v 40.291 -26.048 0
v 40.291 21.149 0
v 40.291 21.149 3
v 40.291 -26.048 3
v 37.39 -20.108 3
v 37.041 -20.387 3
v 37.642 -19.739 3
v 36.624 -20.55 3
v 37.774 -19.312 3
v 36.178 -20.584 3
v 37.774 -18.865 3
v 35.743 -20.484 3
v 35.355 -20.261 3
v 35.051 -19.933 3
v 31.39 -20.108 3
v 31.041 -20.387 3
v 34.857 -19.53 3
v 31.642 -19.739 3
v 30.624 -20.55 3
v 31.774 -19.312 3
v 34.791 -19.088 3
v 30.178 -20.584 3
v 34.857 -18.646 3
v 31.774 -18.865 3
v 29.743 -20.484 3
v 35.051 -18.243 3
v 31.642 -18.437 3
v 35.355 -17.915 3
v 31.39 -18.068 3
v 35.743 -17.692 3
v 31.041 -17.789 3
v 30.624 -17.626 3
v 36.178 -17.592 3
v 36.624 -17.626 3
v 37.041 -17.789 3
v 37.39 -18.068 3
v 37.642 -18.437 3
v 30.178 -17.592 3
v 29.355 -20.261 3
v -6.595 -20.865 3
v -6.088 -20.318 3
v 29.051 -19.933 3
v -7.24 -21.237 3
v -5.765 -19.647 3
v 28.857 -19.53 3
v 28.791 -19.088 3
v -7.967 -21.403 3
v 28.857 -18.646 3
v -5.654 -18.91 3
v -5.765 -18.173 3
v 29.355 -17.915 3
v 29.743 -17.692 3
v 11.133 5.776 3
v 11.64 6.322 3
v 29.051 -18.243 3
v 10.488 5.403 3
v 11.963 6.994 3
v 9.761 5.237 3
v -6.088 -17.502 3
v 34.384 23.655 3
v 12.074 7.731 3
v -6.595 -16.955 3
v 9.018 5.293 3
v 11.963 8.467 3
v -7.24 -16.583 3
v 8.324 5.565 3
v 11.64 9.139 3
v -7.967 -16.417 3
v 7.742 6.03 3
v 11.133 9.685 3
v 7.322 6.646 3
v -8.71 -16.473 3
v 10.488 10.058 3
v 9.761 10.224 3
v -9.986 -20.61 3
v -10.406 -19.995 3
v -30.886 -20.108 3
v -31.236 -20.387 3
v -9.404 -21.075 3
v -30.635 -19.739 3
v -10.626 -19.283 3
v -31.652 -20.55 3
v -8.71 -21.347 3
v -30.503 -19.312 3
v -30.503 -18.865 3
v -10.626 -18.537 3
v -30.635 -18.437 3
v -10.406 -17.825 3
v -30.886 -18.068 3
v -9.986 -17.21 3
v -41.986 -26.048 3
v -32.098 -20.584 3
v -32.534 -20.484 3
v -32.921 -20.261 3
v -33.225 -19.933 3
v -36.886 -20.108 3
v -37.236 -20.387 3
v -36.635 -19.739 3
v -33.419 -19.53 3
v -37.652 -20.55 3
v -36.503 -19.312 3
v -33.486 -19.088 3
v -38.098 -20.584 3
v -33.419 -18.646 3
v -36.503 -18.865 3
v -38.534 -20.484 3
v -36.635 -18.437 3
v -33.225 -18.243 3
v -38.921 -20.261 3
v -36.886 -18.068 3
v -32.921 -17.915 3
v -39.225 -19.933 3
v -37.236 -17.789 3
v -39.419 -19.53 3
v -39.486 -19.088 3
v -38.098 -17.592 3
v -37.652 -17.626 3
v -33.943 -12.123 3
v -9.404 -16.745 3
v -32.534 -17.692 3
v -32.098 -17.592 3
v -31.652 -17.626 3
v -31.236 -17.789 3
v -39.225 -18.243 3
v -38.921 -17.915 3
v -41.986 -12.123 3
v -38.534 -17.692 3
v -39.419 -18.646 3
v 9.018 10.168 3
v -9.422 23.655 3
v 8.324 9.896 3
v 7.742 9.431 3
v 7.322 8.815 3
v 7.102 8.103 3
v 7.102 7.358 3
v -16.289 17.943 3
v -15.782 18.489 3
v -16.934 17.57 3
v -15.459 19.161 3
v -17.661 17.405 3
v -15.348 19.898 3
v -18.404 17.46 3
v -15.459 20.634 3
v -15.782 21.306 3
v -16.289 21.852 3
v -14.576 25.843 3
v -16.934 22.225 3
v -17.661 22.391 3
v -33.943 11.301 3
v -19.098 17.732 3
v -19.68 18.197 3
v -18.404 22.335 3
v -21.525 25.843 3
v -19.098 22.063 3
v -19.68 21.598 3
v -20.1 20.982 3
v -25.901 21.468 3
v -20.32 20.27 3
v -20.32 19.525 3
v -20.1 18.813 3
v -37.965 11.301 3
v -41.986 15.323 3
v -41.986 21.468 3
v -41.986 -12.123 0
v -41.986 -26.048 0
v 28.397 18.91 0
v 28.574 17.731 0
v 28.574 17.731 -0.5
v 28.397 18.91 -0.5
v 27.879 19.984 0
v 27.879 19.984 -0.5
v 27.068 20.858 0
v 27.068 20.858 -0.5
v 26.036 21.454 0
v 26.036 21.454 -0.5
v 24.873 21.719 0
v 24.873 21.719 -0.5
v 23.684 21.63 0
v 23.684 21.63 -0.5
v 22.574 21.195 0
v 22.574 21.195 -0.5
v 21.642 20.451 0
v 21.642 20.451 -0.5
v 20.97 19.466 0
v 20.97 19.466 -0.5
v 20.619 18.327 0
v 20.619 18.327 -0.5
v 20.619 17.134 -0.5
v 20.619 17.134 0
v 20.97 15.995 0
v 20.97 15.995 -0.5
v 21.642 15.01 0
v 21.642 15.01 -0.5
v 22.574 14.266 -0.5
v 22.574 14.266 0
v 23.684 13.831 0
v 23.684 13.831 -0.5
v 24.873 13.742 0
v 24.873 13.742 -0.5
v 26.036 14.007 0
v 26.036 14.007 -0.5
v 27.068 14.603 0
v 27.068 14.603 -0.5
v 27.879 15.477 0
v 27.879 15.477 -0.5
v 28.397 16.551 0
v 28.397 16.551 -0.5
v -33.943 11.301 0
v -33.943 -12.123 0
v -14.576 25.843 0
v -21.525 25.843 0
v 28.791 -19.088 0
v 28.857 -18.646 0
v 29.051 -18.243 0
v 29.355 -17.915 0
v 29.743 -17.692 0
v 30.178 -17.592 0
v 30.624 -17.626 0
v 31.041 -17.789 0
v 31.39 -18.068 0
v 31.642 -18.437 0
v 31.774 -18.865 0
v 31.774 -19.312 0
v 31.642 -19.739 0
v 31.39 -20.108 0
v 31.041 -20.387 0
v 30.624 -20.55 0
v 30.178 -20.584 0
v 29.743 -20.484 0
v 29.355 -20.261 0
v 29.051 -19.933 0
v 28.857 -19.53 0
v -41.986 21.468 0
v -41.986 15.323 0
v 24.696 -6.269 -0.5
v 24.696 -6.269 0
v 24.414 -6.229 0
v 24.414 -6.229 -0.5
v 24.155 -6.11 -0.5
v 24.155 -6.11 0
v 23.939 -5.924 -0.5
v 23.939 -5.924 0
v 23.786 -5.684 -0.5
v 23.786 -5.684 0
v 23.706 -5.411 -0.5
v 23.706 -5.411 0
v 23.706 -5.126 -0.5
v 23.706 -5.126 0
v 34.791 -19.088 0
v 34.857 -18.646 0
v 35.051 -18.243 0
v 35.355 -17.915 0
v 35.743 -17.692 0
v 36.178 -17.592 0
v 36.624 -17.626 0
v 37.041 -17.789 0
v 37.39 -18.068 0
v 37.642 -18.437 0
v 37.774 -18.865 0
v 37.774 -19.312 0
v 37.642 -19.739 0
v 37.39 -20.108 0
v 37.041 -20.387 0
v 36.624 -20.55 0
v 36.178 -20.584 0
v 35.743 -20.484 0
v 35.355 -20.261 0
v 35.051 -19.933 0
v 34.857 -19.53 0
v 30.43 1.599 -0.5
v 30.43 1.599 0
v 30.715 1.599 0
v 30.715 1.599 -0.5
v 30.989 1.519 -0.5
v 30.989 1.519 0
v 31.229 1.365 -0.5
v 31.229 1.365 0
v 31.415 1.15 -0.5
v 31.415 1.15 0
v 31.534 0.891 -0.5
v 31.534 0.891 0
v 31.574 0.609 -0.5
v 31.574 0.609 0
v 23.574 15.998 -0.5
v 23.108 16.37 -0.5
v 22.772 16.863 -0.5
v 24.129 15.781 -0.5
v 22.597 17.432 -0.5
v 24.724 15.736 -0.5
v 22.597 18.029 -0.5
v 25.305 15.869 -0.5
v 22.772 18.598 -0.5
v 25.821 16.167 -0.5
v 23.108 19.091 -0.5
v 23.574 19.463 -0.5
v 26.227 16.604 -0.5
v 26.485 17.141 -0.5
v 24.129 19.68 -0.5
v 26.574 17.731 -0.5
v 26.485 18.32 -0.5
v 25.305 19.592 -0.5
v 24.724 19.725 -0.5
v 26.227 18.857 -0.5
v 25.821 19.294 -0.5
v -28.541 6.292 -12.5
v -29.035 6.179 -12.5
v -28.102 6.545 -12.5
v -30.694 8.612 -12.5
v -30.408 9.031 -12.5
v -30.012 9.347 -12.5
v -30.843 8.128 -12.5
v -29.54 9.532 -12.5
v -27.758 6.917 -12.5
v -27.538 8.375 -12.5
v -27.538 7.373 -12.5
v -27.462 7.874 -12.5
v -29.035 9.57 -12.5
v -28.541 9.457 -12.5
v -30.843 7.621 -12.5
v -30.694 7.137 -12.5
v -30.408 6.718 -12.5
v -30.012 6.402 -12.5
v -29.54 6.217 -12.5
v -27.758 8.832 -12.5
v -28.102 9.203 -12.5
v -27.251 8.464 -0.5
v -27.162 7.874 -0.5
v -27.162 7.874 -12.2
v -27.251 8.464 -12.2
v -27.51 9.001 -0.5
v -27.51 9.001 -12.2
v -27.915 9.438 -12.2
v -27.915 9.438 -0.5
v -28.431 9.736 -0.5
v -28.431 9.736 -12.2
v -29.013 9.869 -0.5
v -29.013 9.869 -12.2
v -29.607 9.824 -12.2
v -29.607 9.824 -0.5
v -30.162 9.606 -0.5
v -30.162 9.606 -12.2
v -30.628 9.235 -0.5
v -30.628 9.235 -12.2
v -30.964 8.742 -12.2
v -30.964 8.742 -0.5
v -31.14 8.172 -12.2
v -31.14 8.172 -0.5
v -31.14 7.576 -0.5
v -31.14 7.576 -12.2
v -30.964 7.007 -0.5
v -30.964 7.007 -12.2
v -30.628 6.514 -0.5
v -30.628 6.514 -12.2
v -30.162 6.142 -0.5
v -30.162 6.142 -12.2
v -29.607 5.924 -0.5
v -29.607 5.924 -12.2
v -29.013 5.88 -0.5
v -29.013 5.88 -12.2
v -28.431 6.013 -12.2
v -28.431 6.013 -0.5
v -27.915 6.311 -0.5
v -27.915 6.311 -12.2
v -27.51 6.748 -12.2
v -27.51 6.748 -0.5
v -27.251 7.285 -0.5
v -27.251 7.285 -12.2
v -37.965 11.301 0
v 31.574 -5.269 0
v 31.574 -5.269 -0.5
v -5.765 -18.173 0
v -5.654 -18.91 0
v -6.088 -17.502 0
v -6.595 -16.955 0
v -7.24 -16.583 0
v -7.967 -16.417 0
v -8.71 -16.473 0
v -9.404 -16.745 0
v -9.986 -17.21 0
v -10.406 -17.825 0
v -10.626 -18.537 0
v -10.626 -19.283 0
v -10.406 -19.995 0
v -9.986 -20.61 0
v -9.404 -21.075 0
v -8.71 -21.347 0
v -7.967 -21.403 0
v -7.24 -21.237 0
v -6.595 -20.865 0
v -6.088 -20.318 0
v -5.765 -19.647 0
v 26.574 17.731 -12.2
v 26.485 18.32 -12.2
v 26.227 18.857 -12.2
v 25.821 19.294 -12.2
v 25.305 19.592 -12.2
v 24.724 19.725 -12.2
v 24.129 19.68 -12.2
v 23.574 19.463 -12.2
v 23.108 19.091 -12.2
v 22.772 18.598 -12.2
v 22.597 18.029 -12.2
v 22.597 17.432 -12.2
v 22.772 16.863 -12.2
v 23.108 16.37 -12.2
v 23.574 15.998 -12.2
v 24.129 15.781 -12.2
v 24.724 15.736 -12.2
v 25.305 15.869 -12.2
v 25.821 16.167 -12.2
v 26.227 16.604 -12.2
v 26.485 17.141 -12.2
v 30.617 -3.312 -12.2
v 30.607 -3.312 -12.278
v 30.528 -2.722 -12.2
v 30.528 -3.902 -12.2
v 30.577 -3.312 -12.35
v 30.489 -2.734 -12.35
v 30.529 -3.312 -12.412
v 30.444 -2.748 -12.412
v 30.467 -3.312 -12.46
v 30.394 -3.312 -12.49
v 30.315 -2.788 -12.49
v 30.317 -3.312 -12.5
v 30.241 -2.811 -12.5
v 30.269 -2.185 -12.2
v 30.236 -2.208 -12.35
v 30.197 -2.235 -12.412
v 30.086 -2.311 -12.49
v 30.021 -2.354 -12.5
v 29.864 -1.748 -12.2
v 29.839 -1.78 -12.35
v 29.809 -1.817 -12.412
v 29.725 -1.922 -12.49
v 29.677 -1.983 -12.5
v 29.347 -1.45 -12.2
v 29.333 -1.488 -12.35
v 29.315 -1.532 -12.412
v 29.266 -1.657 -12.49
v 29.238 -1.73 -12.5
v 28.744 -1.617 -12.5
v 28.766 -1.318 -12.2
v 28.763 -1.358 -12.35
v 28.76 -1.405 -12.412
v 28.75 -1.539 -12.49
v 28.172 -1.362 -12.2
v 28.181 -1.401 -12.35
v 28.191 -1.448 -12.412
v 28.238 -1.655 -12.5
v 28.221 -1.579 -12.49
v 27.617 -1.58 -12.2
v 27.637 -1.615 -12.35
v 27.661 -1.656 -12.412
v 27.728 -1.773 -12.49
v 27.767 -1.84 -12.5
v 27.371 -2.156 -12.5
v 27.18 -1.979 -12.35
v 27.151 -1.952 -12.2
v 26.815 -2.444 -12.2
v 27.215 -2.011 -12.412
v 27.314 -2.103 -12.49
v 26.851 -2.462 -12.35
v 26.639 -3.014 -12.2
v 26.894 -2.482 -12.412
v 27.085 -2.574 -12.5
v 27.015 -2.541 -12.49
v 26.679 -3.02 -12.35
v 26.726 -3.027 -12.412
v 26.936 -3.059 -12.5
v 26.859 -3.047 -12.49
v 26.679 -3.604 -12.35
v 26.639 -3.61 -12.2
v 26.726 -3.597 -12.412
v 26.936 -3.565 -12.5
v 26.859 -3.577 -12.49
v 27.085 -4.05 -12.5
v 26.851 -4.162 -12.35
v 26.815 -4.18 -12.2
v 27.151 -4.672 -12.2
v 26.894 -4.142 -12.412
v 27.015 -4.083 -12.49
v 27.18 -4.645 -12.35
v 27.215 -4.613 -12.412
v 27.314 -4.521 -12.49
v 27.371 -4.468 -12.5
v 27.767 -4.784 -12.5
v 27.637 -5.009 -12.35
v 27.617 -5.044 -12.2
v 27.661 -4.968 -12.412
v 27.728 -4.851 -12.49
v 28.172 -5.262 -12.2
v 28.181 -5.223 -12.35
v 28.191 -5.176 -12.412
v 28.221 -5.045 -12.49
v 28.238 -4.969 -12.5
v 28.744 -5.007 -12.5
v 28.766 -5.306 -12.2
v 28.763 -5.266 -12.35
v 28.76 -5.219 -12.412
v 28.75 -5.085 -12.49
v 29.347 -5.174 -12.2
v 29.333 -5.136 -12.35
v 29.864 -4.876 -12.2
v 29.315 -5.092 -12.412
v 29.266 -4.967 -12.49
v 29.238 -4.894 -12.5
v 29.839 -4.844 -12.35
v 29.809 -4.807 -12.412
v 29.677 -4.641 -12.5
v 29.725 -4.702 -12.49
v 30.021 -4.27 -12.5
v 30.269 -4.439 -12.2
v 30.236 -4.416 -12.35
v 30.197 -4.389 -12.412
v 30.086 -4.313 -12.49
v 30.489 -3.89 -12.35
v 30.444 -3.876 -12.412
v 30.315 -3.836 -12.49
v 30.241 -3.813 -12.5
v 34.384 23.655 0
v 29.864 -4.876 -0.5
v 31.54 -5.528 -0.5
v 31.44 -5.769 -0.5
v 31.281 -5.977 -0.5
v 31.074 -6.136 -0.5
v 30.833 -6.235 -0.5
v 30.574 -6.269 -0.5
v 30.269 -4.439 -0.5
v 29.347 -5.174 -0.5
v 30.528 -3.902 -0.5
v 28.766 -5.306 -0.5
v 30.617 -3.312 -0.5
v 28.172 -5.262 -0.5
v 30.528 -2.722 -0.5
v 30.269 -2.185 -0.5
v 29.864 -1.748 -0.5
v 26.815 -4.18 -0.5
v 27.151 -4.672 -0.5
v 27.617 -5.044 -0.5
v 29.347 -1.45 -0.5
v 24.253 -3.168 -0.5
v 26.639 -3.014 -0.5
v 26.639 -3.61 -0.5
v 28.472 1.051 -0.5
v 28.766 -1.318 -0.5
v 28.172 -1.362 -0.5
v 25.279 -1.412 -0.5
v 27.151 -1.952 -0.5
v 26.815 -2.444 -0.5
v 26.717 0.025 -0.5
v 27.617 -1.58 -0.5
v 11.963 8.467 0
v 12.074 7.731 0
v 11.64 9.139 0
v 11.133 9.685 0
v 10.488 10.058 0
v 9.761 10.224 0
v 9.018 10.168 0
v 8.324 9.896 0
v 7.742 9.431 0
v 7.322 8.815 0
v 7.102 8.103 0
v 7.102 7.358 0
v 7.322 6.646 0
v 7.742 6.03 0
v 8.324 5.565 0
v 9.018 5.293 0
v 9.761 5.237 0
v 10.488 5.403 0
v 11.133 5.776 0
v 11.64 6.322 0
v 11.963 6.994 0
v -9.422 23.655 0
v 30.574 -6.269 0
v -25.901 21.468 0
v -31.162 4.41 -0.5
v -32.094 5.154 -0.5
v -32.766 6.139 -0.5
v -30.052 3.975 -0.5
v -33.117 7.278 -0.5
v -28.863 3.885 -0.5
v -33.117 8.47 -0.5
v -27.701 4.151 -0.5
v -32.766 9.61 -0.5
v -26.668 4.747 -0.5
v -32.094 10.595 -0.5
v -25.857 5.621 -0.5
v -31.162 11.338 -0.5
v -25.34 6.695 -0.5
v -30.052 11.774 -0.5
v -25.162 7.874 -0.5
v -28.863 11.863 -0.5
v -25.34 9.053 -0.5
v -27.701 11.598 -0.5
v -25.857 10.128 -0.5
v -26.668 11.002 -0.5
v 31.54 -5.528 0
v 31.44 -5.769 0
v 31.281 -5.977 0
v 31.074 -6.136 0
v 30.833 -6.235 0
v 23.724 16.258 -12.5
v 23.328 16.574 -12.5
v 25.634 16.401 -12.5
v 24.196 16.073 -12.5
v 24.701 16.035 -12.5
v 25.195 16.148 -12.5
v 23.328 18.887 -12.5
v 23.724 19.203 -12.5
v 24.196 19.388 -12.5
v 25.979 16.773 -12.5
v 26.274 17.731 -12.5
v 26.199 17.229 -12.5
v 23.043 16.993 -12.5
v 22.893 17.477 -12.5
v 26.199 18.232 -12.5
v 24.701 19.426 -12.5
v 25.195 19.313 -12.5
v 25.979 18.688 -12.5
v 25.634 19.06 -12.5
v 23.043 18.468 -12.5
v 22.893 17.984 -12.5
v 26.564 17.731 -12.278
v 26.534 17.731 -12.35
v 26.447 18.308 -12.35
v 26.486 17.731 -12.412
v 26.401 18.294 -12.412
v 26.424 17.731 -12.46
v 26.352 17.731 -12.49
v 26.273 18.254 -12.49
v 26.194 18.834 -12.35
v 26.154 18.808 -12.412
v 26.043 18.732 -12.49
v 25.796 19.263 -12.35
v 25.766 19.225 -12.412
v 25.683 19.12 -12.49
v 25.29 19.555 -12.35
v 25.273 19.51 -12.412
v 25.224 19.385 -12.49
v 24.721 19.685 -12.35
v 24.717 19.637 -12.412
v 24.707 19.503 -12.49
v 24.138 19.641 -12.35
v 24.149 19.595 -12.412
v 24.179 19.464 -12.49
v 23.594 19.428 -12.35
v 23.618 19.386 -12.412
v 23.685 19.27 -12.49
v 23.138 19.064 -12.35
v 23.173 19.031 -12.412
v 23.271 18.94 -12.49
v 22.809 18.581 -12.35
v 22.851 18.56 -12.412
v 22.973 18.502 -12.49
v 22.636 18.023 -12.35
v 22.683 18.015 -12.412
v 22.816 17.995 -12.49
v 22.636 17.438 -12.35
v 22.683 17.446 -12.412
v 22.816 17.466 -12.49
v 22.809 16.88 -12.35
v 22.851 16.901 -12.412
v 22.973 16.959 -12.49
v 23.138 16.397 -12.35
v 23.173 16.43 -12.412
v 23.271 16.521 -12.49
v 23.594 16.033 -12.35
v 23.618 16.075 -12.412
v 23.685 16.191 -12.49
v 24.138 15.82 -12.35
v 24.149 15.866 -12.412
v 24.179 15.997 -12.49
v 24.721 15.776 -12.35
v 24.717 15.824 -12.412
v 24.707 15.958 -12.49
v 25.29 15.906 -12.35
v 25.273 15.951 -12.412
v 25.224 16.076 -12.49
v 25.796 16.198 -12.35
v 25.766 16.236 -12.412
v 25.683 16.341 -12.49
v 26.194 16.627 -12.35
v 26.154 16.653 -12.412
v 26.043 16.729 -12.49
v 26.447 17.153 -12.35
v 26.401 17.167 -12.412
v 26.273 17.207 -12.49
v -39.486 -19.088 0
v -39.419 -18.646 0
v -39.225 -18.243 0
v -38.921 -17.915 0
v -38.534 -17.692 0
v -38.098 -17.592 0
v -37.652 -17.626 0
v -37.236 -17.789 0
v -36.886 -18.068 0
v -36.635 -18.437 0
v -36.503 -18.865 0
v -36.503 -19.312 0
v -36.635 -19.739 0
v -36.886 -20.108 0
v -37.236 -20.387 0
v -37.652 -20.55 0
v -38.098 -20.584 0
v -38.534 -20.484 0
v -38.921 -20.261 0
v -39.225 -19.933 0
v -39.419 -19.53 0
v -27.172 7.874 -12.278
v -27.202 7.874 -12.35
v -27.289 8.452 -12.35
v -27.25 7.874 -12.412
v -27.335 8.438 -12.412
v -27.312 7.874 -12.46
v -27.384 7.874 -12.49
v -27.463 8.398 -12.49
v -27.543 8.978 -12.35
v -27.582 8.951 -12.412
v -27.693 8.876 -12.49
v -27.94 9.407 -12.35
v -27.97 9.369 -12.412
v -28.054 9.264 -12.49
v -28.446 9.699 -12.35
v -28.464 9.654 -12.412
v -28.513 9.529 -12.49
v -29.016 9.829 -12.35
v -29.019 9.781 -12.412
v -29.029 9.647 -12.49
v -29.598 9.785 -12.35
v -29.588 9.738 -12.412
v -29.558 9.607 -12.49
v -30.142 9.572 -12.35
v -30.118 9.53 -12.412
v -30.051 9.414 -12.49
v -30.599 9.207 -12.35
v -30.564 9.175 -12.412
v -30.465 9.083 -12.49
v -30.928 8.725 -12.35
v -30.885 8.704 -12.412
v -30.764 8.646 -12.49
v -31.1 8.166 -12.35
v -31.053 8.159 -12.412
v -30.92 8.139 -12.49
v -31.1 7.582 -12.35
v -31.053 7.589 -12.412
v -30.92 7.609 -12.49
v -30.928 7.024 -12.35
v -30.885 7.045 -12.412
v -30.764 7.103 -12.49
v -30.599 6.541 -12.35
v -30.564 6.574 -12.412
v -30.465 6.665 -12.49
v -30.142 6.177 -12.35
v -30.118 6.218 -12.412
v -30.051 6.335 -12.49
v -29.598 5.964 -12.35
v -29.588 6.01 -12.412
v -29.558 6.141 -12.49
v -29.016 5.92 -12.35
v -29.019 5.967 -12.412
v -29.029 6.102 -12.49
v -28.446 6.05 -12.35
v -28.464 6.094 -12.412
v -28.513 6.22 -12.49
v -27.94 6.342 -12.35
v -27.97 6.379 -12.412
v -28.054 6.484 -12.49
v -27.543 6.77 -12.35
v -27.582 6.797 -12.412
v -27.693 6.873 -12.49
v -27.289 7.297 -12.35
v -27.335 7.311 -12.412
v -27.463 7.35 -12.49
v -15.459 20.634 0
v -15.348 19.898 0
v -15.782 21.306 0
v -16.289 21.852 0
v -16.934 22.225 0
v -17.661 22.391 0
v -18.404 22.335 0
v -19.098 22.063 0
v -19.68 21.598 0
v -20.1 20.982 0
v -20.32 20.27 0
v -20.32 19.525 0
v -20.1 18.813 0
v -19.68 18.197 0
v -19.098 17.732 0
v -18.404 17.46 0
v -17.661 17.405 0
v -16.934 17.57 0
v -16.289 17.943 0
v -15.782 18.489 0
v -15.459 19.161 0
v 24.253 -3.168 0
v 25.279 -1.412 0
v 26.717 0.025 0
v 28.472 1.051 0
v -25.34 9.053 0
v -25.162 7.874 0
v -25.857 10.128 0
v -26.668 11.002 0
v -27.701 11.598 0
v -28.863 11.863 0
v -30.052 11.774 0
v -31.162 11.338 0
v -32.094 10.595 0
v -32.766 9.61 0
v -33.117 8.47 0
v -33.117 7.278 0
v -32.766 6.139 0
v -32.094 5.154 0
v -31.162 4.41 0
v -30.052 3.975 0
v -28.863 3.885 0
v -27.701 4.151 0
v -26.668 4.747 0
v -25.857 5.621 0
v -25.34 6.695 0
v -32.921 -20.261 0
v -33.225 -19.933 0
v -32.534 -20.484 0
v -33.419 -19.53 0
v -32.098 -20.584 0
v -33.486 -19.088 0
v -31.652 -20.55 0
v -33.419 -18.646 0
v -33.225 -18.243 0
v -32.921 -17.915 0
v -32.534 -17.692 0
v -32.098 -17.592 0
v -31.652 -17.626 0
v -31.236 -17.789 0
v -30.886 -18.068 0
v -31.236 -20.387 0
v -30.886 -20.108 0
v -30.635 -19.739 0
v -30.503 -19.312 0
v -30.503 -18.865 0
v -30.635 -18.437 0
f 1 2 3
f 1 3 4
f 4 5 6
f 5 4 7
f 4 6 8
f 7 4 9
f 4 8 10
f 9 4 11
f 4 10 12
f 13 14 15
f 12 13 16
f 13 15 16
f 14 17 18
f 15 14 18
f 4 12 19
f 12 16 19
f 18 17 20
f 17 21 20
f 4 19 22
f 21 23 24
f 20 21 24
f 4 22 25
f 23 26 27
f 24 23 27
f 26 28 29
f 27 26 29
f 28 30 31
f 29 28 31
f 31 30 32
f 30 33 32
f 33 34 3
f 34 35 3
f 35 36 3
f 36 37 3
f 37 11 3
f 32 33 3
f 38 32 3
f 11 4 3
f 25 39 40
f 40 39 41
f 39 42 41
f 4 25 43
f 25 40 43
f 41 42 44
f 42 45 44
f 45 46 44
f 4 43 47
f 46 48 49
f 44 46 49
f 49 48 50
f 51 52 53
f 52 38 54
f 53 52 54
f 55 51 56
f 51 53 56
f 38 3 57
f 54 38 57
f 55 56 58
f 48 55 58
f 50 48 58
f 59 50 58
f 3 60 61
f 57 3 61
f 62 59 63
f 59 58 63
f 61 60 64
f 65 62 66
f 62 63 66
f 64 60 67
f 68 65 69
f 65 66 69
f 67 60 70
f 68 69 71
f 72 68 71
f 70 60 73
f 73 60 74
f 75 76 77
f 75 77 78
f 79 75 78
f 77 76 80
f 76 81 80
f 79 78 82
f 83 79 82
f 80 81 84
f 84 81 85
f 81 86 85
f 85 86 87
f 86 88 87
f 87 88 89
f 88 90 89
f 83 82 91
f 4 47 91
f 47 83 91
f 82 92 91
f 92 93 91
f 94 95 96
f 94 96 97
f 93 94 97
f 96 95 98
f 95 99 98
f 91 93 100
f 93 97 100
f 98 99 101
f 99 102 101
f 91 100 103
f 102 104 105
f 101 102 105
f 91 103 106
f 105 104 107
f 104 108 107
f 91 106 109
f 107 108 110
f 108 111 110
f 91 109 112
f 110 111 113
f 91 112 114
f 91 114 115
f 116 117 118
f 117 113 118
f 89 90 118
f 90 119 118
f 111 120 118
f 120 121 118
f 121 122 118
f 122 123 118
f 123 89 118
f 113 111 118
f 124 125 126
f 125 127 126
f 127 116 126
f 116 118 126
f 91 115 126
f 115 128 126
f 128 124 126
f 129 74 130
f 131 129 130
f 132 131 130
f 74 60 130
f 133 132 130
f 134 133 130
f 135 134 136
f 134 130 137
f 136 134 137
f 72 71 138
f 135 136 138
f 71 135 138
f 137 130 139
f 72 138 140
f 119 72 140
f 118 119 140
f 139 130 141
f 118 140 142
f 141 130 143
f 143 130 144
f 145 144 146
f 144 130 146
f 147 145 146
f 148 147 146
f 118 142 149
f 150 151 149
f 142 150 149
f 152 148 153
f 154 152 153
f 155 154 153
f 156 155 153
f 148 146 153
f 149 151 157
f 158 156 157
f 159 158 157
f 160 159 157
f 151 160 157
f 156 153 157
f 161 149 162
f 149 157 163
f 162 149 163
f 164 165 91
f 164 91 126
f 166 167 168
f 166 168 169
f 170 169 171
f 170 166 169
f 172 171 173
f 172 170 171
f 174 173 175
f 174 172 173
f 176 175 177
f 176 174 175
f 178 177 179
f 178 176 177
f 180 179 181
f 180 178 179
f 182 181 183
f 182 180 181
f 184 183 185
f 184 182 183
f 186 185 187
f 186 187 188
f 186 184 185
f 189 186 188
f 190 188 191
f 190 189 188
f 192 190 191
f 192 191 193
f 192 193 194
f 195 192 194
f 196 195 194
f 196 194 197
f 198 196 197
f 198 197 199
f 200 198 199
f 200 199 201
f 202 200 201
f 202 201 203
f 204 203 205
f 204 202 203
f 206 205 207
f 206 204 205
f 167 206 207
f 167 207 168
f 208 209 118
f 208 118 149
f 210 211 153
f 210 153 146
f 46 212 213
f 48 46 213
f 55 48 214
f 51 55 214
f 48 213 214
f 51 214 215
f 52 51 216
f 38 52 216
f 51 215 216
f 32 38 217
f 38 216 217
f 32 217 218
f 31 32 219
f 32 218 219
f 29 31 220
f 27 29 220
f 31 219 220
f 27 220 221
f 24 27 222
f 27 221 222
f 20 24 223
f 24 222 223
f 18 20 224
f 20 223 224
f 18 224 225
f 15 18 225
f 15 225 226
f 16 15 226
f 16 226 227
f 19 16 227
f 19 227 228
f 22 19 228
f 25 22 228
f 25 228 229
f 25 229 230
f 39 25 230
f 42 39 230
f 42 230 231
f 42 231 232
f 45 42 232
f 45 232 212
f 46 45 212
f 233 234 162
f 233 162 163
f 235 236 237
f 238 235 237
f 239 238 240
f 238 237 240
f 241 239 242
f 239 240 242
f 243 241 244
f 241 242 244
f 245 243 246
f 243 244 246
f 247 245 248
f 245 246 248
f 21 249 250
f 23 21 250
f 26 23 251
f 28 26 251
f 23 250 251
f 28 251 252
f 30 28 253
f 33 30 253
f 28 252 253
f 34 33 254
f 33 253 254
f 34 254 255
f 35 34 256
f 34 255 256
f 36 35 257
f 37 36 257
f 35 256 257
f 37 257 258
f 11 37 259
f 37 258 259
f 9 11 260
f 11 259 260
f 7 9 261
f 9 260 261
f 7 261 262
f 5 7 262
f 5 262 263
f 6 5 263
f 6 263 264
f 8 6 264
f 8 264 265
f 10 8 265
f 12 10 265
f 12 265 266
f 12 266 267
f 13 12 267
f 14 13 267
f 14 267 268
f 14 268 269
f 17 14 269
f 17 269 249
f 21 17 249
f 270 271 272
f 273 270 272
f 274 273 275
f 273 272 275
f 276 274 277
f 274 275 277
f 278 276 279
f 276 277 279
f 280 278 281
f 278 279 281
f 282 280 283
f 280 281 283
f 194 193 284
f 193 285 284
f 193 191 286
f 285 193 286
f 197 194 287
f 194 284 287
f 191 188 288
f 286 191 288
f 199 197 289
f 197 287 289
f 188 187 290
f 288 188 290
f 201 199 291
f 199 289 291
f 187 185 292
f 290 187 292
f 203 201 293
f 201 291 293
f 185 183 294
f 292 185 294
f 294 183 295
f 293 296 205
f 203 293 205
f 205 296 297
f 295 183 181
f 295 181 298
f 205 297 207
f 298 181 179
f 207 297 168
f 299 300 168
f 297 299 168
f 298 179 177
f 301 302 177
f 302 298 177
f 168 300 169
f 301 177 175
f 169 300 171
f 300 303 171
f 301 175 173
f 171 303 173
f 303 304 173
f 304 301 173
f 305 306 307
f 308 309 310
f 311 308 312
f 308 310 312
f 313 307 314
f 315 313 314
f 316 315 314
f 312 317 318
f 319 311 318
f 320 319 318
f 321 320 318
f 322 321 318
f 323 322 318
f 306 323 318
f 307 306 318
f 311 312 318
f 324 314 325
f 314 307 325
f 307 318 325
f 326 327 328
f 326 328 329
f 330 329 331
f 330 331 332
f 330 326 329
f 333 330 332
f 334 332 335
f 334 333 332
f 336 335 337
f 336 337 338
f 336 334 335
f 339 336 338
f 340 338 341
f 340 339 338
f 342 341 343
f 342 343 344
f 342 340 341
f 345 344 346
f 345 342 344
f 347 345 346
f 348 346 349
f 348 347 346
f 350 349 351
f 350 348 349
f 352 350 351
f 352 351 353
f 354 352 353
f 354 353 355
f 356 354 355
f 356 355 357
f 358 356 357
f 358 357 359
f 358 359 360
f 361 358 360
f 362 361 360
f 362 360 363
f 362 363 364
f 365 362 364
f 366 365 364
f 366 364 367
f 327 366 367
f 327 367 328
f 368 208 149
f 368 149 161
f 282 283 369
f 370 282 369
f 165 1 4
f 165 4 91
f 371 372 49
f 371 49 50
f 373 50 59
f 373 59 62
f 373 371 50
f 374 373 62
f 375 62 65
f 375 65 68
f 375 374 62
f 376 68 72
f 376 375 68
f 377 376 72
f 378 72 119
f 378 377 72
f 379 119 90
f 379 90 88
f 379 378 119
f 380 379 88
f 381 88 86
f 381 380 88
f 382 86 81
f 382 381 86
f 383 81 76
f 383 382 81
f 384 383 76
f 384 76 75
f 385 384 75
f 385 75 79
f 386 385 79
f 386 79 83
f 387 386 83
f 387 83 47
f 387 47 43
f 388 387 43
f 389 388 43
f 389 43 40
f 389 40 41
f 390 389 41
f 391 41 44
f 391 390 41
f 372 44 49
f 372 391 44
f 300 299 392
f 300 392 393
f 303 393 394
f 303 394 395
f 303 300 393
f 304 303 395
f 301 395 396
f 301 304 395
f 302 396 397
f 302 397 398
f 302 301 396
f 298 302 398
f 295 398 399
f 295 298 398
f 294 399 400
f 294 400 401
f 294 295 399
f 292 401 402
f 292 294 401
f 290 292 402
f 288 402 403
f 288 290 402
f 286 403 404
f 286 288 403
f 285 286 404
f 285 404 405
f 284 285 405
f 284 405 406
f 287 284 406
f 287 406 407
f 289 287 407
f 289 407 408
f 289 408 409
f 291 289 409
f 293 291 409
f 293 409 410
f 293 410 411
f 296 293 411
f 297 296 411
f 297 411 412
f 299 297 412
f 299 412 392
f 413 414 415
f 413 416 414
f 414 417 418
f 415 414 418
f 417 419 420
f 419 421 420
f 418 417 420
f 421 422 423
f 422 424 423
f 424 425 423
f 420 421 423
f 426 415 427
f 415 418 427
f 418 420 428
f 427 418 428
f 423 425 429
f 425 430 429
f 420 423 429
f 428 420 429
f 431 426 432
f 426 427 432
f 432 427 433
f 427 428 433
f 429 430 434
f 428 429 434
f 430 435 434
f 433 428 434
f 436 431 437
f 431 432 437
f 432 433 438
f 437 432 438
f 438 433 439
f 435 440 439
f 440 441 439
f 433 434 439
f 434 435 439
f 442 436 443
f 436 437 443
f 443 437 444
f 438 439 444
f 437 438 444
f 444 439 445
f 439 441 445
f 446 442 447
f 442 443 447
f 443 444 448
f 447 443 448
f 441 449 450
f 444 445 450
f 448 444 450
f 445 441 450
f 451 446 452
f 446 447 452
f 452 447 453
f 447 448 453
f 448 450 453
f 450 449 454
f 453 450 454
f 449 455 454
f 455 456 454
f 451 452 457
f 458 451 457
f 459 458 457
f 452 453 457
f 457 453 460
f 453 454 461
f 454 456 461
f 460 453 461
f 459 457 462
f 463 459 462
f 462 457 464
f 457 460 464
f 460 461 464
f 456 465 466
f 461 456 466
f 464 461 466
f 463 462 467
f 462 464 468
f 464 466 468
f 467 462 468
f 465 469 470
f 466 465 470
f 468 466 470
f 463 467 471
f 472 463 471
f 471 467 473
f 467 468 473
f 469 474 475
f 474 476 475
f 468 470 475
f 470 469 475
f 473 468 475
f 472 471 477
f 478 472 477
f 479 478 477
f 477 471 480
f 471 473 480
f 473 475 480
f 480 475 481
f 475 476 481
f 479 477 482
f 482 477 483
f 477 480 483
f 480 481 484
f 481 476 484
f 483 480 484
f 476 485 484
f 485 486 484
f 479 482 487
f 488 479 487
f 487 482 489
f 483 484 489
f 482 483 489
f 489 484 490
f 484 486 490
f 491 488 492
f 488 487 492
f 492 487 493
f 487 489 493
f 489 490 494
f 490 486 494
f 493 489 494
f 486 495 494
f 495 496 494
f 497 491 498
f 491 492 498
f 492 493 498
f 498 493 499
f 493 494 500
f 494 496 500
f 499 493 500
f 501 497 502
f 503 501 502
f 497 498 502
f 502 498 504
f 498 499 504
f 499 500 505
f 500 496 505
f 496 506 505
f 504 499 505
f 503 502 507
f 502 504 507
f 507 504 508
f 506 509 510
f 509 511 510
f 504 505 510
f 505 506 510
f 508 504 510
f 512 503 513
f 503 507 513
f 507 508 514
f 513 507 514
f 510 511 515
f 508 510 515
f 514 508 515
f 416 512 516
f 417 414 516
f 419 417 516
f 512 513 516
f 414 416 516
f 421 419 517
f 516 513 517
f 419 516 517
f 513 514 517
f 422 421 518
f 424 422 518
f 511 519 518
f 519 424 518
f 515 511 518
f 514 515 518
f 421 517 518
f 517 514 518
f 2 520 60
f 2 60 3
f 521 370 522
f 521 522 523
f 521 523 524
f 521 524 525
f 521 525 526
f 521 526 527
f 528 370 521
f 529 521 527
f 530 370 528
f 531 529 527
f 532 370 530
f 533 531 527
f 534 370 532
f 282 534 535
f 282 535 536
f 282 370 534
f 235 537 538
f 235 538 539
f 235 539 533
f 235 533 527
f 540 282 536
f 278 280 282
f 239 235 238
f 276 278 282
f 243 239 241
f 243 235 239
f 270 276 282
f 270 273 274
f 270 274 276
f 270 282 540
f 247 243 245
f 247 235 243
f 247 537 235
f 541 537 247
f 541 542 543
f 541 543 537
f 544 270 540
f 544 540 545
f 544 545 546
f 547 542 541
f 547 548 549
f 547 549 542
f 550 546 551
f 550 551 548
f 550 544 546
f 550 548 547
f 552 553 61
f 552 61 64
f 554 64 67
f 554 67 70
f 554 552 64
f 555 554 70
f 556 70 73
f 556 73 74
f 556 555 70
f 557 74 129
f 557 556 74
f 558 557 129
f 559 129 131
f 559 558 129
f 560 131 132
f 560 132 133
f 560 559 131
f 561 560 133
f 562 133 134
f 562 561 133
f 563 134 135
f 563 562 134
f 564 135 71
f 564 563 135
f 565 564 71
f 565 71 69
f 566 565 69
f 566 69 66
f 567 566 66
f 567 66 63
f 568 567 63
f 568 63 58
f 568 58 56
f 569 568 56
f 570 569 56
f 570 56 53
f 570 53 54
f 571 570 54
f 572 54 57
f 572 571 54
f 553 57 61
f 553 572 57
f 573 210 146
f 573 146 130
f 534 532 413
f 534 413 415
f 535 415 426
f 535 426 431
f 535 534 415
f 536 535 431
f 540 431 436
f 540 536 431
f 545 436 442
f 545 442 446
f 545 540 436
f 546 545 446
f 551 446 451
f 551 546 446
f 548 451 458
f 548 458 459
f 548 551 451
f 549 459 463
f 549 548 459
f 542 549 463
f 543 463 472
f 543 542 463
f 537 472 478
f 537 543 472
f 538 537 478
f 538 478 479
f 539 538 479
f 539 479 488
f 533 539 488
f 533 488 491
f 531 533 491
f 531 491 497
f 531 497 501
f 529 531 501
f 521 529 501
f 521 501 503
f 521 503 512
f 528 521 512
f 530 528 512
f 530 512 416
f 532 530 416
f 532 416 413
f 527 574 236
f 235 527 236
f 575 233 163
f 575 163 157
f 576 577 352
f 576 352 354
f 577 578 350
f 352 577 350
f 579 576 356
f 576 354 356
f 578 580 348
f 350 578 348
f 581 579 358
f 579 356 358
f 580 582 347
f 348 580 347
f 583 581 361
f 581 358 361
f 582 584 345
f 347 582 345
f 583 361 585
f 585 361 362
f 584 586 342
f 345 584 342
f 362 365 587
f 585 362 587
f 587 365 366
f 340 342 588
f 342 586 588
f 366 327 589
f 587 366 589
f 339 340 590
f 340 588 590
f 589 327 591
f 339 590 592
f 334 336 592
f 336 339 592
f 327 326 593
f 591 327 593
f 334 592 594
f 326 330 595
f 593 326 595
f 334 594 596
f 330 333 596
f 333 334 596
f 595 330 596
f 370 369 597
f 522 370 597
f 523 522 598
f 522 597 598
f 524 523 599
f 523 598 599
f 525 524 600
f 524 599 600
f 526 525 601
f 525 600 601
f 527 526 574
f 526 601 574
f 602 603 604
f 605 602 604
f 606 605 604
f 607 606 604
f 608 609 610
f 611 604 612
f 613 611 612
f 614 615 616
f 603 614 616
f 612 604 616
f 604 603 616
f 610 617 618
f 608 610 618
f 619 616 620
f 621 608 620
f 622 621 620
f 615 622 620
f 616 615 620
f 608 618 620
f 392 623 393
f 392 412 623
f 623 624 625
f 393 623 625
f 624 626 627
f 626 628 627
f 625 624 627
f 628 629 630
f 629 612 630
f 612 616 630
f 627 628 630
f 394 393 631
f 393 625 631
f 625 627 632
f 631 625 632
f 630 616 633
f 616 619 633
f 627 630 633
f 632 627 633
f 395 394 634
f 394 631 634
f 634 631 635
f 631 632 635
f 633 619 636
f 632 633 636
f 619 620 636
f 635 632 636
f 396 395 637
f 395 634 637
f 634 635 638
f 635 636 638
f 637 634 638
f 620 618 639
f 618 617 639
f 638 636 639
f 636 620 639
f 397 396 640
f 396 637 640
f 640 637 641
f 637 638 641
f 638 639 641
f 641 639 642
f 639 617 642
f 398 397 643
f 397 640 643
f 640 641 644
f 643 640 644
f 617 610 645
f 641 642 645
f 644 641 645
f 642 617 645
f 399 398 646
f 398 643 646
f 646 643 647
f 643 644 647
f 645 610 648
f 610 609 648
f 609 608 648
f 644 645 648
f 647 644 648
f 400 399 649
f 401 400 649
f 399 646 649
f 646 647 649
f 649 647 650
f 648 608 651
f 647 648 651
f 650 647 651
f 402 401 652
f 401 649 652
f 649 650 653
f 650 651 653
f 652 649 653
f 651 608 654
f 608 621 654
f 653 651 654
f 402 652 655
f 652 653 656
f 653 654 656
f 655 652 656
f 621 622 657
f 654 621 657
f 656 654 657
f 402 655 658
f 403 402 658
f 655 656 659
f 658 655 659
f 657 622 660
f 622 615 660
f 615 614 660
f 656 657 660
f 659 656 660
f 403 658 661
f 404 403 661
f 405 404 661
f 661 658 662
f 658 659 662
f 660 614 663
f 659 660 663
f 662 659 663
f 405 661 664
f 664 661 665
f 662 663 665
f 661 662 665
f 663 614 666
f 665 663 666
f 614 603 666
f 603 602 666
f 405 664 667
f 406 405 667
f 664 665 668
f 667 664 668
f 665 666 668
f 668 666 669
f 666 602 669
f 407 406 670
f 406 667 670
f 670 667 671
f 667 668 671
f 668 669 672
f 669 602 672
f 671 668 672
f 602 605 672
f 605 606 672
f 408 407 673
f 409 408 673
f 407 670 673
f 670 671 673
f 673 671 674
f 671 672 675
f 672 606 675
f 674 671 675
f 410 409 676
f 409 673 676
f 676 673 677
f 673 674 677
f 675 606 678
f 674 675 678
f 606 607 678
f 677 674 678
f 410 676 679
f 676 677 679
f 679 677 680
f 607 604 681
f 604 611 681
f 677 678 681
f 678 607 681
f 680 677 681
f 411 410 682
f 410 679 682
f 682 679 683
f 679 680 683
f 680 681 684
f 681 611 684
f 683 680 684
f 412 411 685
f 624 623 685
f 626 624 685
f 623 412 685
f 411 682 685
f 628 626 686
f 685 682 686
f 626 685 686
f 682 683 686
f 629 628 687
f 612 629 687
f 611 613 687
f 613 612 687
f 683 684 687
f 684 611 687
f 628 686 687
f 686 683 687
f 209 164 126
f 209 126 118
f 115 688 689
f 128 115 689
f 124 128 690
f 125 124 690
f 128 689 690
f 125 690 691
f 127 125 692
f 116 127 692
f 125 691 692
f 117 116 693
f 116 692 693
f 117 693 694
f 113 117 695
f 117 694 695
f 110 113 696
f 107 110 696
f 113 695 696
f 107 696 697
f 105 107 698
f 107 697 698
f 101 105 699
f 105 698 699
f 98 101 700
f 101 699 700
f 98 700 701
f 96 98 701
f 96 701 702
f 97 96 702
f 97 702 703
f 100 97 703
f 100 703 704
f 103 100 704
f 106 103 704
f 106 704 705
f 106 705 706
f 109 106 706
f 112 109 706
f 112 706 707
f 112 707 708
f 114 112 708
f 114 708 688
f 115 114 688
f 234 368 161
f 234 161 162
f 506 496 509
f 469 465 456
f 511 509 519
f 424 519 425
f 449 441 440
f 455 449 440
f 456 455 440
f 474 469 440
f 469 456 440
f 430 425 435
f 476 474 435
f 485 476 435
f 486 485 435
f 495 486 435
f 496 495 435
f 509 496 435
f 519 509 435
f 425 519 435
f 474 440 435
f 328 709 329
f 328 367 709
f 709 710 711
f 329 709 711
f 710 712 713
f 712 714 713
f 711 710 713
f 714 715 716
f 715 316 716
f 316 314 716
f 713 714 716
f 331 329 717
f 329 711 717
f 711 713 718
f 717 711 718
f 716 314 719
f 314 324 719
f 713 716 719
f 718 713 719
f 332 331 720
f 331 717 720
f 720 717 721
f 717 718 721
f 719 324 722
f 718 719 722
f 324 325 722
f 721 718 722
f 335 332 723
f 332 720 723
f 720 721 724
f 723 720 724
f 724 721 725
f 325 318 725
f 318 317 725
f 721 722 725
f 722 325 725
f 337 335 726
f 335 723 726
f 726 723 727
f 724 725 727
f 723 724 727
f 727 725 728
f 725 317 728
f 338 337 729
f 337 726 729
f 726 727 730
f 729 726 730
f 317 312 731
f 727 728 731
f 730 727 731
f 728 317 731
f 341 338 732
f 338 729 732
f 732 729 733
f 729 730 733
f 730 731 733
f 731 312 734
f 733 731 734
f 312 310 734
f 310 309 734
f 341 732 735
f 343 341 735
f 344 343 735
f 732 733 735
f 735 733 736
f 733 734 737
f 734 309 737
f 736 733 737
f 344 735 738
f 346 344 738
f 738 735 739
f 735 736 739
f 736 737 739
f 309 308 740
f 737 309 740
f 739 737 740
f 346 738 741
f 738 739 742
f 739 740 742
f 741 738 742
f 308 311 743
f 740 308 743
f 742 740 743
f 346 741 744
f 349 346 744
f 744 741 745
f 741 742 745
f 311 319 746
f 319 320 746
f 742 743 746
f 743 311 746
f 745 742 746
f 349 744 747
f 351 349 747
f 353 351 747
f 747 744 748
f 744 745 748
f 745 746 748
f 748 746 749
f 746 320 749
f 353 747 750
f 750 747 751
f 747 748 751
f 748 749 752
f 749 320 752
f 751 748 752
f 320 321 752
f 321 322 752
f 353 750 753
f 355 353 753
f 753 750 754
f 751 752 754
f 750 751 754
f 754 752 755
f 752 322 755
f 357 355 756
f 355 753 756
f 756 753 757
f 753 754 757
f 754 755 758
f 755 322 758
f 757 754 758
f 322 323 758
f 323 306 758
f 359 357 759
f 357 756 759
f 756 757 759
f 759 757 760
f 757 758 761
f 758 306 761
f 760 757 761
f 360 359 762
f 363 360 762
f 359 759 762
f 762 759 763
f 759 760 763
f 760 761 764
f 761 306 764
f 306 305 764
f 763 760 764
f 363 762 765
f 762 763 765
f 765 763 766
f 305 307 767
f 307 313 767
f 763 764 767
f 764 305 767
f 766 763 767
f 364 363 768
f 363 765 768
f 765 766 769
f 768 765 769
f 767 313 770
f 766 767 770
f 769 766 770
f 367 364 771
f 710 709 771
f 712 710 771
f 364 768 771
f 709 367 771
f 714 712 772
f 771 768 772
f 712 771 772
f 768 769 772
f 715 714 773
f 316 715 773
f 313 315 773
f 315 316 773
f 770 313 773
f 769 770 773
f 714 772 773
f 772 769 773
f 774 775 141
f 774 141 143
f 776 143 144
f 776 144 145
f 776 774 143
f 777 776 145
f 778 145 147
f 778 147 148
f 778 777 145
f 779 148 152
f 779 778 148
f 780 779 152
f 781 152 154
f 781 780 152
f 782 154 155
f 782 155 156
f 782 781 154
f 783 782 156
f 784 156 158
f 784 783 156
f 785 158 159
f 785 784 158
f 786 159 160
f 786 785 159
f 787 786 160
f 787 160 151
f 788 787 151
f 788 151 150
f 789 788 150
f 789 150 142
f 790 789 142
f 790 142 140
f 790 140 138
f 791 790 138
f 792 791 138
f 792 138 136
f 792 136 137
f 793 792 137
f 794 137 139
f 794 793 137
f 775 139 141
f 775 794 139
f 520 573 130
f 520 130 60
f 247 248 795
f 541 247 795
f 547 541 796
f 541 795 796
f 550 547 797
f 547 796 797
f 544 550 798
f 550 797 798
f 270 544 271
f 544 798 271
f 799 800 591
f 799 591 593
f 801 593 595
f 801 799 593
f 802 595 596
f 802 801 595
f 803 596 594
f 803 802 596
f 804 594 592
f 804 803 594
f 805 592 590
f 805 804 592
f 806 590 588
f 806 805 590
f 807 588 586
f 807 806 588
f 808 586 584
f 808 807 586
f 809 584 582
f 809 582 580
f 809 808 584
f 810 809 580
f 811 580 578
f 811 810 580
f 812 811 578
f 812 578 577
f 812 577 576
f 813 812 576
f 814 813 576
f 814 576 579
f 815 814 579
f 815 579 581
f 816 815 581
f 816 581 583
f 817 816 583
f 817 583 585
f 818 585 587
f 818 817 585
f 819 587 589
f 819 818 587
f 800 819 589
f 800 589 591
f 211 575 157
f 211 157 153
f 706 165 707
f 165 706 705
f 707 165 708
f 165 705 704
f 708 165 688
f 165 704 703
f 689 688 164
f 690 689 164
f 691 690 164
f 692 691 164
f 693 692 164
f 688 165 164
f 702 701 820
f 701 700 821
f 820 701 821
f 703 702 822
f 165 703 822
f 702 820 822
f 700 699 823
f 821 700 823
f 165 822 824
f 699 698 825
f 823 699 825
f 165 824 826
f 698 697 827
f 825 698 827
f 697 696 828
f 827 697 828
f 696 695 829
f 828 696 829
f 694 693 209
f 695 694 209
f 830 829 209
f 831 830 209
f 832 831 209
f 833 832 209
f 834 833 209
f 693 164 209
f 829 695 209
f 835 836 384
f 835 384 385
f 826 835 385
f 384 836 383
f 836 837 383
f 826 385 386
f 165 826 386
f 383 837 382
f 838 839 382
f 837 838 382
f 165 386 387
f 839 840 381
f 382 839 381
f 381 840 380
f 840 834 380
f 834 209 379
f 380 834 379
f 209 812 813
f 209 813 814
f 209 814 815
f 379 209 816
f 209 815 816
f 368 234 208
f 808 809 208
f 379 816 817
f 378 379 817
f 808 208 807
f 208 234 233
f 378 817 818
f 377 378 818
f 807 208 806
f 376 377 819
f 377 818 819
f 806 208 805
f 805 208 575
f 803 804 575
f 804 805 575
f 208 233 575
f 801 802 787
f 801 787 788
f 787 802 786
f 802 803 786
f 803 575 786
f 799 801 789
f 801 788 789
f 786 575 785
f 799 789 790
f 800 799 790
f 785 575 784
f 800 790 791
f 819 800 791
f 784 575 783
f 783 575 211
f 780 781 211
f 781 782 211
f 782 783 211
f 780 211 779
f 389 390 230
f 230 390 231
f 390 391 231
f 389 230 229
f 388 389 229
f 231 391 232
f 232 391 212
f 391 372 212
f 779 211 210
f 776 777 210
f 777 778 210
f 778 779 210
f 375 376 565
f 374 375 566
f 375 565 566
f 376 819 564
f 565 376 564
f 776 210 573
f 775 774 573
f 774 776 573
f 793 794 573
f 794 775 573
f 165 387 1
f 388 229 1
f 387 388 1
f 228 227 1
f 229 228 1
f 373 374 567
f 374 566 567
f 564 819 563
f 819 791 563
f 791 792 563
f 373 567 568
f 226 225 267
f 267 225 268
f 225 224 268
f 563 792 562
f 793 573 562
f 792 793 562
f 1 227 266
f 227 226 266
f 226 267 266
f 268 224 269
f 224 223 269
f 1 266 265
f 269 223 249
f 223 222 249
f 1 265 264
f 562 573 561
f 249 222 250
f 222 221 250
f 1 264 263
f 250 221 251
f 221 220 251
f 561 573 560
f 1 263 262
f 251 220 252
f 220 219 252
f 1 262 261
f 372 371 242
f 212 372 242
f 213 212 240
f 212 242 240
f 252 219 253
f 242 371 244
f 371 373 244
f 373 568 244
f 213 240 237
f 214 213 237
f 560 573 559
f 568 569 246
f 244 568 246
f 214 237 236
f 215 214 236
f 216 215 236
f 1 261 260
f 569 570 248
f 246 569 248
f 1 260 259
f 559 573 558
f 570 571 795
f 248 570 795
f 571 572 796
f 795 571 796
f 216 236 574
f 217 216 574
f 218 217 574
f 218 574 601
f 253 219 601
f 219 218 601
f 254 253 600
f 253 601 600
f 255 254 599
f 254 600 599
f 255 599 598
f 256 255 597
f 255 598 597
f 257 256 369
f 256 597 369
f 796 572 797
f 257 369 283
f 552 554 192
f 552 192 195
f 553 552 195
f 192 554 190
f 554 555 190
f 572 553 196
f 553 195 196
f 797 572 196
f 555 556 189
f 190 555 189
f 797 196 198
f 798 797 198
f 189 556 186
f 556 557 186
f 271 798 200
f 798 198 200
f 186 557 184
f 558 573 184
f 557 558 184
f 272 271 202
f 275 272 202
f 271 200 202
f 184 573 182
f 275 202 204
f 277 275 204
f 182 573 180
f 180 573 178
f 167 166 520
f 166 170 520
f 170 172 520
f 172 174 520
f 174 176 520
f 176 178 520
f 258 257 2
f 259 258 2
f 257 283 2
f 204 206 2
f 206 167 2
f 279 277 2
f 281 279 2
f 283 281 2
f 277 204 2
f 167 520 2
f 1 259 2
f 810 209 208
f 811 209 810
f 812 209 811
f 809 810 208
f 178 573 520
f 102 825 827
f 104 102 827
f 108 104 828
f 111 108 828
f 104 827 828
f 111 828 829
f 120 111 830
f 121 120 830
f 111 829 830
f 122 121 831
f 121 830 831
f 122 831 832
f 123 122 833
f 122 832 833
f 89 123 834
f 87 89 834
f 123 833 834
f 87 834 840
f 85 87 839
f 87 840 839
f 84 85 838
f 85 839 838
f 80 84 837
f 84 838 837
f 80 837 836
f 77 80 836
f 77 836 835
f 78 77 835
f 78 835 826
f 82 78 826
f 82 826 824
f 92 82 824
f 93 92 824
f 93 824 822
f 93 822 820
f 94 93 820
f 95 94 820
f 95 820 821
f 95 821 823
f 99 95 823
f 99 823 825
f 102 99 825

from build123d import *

# Parameters (mm, degrees)
SKETCH_2_R          = 2.5
EXTRUDE_11_DEPTH    = 3
SKETCH_2_16_R       = 2
SKETCH_2_16_R_2     = 4
EXTRUDE_12_DEPTH    = 0.5
SKETCH_2_17_R       = 2
EXTRUDE_13_DEPTH    = 12.5
FILLET_1_R          = 0.3
CUT_EXTRUDE_1_REACH = 52.966
SKETCH_3_R          = 1.5


with BuildPart() as part:
    # 스케치2 → 보스-돌출11 (new body)
    with BuildSketch(Plane.XY):
        Polygon((-25.900833035, 21.467672234), (-41.985987982, 21.467672234), (-41.985987982, 15.322651266), (-37.964699246, 11.301362529), (-33.943410509, 11.301362529), (-33.943410509, -12.123358681), (-41.985987982, -12.123358681), (-41.985987982, -26.048068749), (40.290588771, -26.048068749), (40.290588771, 21.148605879), (34.384238258, 23.655411353), (-9.421808725, 23.655411353), (-14.576398582, 25.843150472), (-21.525354797, 25.843150472), align=None)
        with Locations((-8.153758739, -18.910029411)):
            Circle(SKETCH_2_R, mode=Mode.SUBTRACT)
        with Locations((-17.847699606, 19.897540861)):
            Circle(SKETCH_2_R, mode=Mode.SUBTRACT)
        with Locations((9.574246485, 7.73050044)):
            Circle(SKETCH_2_R, mode=Mode.SUBTRACT)
    extrude(amount=EXTRUDE_11_DEPTH)

    # 스케치2<16> → 보스-돌출12 (add)
    # profile 1 of 3: a face of its own
    with BuildSketch(Plane.XY):
        with BuildLine():
            ThreePointArc((23.706105599, -5.125632338), (23.939439675, -5.923767386), (24.695702599, -6.26949956))
            Line((24.695702599, -6.26949956), (30.574246485, -6.26949956))
            ThreePointArc((30.574246485, -6.26949956), (31.281353266, -5.976606341), (31.574246485, -5.26949956))
            Line((31.574246485, -5.26949956), (31.574246485, 0.609044326))
            ThreePointArc((31.574246485, 0.609044326), (31.228514311, 1.365307251), (30.430379263, 1.598641326))
            ThreePointArc((30.430379263, 1.598641326), (25.952143977, -0.647397052), (23.706105599, -5.125632338))
        make_face()
        with Locations((28.616748621, -3.312001696)):
            Circle(SKETCH_2_16_R, mode=Mode.SUBTRACT)
    # profile 2 of 3: a face of its own
    with BuildSketch(Plane.XY):
        with Locations((-29.162107176, 7.874269984)):
            Circle(SKETCH_2_16_R_2)
        with Locations((-29.162107176, 7.874269984)):
            Circle(SKETCH_2_16_R, mode=Mode.SUBTRACT)
    # profile 3 of 3: a face of its own
    with BuildSketch(Plane.XY):
        with Locations((24.574246485, 17.73050044)):
            Circle(SKETCH_2_16_R_2)
        with Locations((24.574246485, 17.73050044)):
            Circle(SKETCH_2_16_R, mode=Mode.SUBTRACT)
    extrude(amount=-EXTRUDE_12_DEPTH)

    # 스케치2<17> → 보스-돌출13 (add)
    with BuildSketch(Plane.XY):
        with Locations((-29.162107176, 7.874269984)):
            Circle(SKETCH_2_17_R)
        with Locations((24.574246485, 17.73050044)):
            Circle(SKETCH_2_17_R)
        with Locations((28.616748621, -3.312001696)):
            Circle(SKETCH_2_17_R)
    extrude(amount=-EXTRUDE_13_DEPTH)

    # 필렛1
    fillet_1_edges = [part.edges().sort_by_distance(p)[0] for p in [
        (26.616748621, -3.312001696, -12.5),
        (22.574246485, 17.73050044, -12.5),
        (-31.162107176, 7.874269984, -12.5),
    ]]
    fillet(fillet_1_edges, radius=FILLET_1_R)

    # 스케치3 → 컷-돌출1 (cut, up to next)
    with BuildSketch(Plane(origin=(0, 0, 0), x_dir=(-1, 0, 0), z_dir=(0, 0, -1)), mode=Mode.PRIVATE) as cut_extrude_1_sk1:
        with Locations((-36.290588771, -19.088068749)):
            Circle(SKETCH_3_R)
    cut_extrude_1_tool1 = extrude(cut_extrude_1_sk1.sketch, amount=-CUT_EXTRUDE_1_REACH, mode=Mode.PRIVATE) & part.part
    # 스케치3 → 컷-돌출1 (cut, up to next)
    with BuildSketch(Plane(origin=(0, 0, 0), x_dir=(-1, 0, 0), z_dir=(0, 0, -1)), mode=Mode.PRIVATE) as cut_extrude_1_sk2:
        with Locations((-30.290588771, -19.088068749)):
            Circle(SKETCH_3_R)
    cut_extrude_1_tool2 = extrude(cut_extrude_1_sk2.sketch, amount=-CUT_EXTRUDE_1_REACH, mode=Mode.PRIVATE) & part.part
    # 스케치3 → 컷-돌출1 (cut, up to next)
    with BuildSketch(Plane(origin=(0, 0, 0), x_dir=(-1, 0, 0), z_dir=(0, 0, -1)), mode=Mode.PRIVATE) as cut_extrude_1_sk3:
        with Locations((31.985987982, -19.088068749)):
            Circle(SKETCH_3_R)
    cut_extrude_1_tool3 = extrude(cut_extrude_1_sk3.sketch, amount=-CUT_EXTRUDE_1_REACH, mode=Mode.PRIVATE) & part.part
    # 스케치3 → 컷-돌출1 (cut, up to next)
    with BuildSketch(Plane(origin=(0, 0, 0), x_dir=(-1, 0, 0), z_dir=(0, 0, -1)), mode=Mode.PRIVATE) as cut_extrude_1_sk4:
        with Locations((37.985987982, -19.088068749)):
            Circle(SKETCH_3_R)
    cut_extrude_1_tool4 = extrude(cut_extrude_1_sk4.sketch, amount=-CUT_EXTRUDE_1_REACH, mode=Mode.PRIVATE) & part.part
    add(cut_extrude_1_tool1.solids().sort_by_distance((36.290589, -19.088069, 0))[0], mode=Mode.SUBTRACT)
    add(cut_extrude_1_tool2.solids().sort_by_distance((30.290589, -19.088069, 0))[0], mode=Mode.SUBTRACT)
    add(cut_extrude_1_tool3.solids().sort_by_distance((-31.985988, -19.088069, 0))[0], mode=Mode.SUBTRACT)
    add(cut_extrude_1_tool4.solids().sort_by_distance((-37.985988, -19.088069, 0))[0], mode=Mode.SUBTRACT)


solid = part.part
